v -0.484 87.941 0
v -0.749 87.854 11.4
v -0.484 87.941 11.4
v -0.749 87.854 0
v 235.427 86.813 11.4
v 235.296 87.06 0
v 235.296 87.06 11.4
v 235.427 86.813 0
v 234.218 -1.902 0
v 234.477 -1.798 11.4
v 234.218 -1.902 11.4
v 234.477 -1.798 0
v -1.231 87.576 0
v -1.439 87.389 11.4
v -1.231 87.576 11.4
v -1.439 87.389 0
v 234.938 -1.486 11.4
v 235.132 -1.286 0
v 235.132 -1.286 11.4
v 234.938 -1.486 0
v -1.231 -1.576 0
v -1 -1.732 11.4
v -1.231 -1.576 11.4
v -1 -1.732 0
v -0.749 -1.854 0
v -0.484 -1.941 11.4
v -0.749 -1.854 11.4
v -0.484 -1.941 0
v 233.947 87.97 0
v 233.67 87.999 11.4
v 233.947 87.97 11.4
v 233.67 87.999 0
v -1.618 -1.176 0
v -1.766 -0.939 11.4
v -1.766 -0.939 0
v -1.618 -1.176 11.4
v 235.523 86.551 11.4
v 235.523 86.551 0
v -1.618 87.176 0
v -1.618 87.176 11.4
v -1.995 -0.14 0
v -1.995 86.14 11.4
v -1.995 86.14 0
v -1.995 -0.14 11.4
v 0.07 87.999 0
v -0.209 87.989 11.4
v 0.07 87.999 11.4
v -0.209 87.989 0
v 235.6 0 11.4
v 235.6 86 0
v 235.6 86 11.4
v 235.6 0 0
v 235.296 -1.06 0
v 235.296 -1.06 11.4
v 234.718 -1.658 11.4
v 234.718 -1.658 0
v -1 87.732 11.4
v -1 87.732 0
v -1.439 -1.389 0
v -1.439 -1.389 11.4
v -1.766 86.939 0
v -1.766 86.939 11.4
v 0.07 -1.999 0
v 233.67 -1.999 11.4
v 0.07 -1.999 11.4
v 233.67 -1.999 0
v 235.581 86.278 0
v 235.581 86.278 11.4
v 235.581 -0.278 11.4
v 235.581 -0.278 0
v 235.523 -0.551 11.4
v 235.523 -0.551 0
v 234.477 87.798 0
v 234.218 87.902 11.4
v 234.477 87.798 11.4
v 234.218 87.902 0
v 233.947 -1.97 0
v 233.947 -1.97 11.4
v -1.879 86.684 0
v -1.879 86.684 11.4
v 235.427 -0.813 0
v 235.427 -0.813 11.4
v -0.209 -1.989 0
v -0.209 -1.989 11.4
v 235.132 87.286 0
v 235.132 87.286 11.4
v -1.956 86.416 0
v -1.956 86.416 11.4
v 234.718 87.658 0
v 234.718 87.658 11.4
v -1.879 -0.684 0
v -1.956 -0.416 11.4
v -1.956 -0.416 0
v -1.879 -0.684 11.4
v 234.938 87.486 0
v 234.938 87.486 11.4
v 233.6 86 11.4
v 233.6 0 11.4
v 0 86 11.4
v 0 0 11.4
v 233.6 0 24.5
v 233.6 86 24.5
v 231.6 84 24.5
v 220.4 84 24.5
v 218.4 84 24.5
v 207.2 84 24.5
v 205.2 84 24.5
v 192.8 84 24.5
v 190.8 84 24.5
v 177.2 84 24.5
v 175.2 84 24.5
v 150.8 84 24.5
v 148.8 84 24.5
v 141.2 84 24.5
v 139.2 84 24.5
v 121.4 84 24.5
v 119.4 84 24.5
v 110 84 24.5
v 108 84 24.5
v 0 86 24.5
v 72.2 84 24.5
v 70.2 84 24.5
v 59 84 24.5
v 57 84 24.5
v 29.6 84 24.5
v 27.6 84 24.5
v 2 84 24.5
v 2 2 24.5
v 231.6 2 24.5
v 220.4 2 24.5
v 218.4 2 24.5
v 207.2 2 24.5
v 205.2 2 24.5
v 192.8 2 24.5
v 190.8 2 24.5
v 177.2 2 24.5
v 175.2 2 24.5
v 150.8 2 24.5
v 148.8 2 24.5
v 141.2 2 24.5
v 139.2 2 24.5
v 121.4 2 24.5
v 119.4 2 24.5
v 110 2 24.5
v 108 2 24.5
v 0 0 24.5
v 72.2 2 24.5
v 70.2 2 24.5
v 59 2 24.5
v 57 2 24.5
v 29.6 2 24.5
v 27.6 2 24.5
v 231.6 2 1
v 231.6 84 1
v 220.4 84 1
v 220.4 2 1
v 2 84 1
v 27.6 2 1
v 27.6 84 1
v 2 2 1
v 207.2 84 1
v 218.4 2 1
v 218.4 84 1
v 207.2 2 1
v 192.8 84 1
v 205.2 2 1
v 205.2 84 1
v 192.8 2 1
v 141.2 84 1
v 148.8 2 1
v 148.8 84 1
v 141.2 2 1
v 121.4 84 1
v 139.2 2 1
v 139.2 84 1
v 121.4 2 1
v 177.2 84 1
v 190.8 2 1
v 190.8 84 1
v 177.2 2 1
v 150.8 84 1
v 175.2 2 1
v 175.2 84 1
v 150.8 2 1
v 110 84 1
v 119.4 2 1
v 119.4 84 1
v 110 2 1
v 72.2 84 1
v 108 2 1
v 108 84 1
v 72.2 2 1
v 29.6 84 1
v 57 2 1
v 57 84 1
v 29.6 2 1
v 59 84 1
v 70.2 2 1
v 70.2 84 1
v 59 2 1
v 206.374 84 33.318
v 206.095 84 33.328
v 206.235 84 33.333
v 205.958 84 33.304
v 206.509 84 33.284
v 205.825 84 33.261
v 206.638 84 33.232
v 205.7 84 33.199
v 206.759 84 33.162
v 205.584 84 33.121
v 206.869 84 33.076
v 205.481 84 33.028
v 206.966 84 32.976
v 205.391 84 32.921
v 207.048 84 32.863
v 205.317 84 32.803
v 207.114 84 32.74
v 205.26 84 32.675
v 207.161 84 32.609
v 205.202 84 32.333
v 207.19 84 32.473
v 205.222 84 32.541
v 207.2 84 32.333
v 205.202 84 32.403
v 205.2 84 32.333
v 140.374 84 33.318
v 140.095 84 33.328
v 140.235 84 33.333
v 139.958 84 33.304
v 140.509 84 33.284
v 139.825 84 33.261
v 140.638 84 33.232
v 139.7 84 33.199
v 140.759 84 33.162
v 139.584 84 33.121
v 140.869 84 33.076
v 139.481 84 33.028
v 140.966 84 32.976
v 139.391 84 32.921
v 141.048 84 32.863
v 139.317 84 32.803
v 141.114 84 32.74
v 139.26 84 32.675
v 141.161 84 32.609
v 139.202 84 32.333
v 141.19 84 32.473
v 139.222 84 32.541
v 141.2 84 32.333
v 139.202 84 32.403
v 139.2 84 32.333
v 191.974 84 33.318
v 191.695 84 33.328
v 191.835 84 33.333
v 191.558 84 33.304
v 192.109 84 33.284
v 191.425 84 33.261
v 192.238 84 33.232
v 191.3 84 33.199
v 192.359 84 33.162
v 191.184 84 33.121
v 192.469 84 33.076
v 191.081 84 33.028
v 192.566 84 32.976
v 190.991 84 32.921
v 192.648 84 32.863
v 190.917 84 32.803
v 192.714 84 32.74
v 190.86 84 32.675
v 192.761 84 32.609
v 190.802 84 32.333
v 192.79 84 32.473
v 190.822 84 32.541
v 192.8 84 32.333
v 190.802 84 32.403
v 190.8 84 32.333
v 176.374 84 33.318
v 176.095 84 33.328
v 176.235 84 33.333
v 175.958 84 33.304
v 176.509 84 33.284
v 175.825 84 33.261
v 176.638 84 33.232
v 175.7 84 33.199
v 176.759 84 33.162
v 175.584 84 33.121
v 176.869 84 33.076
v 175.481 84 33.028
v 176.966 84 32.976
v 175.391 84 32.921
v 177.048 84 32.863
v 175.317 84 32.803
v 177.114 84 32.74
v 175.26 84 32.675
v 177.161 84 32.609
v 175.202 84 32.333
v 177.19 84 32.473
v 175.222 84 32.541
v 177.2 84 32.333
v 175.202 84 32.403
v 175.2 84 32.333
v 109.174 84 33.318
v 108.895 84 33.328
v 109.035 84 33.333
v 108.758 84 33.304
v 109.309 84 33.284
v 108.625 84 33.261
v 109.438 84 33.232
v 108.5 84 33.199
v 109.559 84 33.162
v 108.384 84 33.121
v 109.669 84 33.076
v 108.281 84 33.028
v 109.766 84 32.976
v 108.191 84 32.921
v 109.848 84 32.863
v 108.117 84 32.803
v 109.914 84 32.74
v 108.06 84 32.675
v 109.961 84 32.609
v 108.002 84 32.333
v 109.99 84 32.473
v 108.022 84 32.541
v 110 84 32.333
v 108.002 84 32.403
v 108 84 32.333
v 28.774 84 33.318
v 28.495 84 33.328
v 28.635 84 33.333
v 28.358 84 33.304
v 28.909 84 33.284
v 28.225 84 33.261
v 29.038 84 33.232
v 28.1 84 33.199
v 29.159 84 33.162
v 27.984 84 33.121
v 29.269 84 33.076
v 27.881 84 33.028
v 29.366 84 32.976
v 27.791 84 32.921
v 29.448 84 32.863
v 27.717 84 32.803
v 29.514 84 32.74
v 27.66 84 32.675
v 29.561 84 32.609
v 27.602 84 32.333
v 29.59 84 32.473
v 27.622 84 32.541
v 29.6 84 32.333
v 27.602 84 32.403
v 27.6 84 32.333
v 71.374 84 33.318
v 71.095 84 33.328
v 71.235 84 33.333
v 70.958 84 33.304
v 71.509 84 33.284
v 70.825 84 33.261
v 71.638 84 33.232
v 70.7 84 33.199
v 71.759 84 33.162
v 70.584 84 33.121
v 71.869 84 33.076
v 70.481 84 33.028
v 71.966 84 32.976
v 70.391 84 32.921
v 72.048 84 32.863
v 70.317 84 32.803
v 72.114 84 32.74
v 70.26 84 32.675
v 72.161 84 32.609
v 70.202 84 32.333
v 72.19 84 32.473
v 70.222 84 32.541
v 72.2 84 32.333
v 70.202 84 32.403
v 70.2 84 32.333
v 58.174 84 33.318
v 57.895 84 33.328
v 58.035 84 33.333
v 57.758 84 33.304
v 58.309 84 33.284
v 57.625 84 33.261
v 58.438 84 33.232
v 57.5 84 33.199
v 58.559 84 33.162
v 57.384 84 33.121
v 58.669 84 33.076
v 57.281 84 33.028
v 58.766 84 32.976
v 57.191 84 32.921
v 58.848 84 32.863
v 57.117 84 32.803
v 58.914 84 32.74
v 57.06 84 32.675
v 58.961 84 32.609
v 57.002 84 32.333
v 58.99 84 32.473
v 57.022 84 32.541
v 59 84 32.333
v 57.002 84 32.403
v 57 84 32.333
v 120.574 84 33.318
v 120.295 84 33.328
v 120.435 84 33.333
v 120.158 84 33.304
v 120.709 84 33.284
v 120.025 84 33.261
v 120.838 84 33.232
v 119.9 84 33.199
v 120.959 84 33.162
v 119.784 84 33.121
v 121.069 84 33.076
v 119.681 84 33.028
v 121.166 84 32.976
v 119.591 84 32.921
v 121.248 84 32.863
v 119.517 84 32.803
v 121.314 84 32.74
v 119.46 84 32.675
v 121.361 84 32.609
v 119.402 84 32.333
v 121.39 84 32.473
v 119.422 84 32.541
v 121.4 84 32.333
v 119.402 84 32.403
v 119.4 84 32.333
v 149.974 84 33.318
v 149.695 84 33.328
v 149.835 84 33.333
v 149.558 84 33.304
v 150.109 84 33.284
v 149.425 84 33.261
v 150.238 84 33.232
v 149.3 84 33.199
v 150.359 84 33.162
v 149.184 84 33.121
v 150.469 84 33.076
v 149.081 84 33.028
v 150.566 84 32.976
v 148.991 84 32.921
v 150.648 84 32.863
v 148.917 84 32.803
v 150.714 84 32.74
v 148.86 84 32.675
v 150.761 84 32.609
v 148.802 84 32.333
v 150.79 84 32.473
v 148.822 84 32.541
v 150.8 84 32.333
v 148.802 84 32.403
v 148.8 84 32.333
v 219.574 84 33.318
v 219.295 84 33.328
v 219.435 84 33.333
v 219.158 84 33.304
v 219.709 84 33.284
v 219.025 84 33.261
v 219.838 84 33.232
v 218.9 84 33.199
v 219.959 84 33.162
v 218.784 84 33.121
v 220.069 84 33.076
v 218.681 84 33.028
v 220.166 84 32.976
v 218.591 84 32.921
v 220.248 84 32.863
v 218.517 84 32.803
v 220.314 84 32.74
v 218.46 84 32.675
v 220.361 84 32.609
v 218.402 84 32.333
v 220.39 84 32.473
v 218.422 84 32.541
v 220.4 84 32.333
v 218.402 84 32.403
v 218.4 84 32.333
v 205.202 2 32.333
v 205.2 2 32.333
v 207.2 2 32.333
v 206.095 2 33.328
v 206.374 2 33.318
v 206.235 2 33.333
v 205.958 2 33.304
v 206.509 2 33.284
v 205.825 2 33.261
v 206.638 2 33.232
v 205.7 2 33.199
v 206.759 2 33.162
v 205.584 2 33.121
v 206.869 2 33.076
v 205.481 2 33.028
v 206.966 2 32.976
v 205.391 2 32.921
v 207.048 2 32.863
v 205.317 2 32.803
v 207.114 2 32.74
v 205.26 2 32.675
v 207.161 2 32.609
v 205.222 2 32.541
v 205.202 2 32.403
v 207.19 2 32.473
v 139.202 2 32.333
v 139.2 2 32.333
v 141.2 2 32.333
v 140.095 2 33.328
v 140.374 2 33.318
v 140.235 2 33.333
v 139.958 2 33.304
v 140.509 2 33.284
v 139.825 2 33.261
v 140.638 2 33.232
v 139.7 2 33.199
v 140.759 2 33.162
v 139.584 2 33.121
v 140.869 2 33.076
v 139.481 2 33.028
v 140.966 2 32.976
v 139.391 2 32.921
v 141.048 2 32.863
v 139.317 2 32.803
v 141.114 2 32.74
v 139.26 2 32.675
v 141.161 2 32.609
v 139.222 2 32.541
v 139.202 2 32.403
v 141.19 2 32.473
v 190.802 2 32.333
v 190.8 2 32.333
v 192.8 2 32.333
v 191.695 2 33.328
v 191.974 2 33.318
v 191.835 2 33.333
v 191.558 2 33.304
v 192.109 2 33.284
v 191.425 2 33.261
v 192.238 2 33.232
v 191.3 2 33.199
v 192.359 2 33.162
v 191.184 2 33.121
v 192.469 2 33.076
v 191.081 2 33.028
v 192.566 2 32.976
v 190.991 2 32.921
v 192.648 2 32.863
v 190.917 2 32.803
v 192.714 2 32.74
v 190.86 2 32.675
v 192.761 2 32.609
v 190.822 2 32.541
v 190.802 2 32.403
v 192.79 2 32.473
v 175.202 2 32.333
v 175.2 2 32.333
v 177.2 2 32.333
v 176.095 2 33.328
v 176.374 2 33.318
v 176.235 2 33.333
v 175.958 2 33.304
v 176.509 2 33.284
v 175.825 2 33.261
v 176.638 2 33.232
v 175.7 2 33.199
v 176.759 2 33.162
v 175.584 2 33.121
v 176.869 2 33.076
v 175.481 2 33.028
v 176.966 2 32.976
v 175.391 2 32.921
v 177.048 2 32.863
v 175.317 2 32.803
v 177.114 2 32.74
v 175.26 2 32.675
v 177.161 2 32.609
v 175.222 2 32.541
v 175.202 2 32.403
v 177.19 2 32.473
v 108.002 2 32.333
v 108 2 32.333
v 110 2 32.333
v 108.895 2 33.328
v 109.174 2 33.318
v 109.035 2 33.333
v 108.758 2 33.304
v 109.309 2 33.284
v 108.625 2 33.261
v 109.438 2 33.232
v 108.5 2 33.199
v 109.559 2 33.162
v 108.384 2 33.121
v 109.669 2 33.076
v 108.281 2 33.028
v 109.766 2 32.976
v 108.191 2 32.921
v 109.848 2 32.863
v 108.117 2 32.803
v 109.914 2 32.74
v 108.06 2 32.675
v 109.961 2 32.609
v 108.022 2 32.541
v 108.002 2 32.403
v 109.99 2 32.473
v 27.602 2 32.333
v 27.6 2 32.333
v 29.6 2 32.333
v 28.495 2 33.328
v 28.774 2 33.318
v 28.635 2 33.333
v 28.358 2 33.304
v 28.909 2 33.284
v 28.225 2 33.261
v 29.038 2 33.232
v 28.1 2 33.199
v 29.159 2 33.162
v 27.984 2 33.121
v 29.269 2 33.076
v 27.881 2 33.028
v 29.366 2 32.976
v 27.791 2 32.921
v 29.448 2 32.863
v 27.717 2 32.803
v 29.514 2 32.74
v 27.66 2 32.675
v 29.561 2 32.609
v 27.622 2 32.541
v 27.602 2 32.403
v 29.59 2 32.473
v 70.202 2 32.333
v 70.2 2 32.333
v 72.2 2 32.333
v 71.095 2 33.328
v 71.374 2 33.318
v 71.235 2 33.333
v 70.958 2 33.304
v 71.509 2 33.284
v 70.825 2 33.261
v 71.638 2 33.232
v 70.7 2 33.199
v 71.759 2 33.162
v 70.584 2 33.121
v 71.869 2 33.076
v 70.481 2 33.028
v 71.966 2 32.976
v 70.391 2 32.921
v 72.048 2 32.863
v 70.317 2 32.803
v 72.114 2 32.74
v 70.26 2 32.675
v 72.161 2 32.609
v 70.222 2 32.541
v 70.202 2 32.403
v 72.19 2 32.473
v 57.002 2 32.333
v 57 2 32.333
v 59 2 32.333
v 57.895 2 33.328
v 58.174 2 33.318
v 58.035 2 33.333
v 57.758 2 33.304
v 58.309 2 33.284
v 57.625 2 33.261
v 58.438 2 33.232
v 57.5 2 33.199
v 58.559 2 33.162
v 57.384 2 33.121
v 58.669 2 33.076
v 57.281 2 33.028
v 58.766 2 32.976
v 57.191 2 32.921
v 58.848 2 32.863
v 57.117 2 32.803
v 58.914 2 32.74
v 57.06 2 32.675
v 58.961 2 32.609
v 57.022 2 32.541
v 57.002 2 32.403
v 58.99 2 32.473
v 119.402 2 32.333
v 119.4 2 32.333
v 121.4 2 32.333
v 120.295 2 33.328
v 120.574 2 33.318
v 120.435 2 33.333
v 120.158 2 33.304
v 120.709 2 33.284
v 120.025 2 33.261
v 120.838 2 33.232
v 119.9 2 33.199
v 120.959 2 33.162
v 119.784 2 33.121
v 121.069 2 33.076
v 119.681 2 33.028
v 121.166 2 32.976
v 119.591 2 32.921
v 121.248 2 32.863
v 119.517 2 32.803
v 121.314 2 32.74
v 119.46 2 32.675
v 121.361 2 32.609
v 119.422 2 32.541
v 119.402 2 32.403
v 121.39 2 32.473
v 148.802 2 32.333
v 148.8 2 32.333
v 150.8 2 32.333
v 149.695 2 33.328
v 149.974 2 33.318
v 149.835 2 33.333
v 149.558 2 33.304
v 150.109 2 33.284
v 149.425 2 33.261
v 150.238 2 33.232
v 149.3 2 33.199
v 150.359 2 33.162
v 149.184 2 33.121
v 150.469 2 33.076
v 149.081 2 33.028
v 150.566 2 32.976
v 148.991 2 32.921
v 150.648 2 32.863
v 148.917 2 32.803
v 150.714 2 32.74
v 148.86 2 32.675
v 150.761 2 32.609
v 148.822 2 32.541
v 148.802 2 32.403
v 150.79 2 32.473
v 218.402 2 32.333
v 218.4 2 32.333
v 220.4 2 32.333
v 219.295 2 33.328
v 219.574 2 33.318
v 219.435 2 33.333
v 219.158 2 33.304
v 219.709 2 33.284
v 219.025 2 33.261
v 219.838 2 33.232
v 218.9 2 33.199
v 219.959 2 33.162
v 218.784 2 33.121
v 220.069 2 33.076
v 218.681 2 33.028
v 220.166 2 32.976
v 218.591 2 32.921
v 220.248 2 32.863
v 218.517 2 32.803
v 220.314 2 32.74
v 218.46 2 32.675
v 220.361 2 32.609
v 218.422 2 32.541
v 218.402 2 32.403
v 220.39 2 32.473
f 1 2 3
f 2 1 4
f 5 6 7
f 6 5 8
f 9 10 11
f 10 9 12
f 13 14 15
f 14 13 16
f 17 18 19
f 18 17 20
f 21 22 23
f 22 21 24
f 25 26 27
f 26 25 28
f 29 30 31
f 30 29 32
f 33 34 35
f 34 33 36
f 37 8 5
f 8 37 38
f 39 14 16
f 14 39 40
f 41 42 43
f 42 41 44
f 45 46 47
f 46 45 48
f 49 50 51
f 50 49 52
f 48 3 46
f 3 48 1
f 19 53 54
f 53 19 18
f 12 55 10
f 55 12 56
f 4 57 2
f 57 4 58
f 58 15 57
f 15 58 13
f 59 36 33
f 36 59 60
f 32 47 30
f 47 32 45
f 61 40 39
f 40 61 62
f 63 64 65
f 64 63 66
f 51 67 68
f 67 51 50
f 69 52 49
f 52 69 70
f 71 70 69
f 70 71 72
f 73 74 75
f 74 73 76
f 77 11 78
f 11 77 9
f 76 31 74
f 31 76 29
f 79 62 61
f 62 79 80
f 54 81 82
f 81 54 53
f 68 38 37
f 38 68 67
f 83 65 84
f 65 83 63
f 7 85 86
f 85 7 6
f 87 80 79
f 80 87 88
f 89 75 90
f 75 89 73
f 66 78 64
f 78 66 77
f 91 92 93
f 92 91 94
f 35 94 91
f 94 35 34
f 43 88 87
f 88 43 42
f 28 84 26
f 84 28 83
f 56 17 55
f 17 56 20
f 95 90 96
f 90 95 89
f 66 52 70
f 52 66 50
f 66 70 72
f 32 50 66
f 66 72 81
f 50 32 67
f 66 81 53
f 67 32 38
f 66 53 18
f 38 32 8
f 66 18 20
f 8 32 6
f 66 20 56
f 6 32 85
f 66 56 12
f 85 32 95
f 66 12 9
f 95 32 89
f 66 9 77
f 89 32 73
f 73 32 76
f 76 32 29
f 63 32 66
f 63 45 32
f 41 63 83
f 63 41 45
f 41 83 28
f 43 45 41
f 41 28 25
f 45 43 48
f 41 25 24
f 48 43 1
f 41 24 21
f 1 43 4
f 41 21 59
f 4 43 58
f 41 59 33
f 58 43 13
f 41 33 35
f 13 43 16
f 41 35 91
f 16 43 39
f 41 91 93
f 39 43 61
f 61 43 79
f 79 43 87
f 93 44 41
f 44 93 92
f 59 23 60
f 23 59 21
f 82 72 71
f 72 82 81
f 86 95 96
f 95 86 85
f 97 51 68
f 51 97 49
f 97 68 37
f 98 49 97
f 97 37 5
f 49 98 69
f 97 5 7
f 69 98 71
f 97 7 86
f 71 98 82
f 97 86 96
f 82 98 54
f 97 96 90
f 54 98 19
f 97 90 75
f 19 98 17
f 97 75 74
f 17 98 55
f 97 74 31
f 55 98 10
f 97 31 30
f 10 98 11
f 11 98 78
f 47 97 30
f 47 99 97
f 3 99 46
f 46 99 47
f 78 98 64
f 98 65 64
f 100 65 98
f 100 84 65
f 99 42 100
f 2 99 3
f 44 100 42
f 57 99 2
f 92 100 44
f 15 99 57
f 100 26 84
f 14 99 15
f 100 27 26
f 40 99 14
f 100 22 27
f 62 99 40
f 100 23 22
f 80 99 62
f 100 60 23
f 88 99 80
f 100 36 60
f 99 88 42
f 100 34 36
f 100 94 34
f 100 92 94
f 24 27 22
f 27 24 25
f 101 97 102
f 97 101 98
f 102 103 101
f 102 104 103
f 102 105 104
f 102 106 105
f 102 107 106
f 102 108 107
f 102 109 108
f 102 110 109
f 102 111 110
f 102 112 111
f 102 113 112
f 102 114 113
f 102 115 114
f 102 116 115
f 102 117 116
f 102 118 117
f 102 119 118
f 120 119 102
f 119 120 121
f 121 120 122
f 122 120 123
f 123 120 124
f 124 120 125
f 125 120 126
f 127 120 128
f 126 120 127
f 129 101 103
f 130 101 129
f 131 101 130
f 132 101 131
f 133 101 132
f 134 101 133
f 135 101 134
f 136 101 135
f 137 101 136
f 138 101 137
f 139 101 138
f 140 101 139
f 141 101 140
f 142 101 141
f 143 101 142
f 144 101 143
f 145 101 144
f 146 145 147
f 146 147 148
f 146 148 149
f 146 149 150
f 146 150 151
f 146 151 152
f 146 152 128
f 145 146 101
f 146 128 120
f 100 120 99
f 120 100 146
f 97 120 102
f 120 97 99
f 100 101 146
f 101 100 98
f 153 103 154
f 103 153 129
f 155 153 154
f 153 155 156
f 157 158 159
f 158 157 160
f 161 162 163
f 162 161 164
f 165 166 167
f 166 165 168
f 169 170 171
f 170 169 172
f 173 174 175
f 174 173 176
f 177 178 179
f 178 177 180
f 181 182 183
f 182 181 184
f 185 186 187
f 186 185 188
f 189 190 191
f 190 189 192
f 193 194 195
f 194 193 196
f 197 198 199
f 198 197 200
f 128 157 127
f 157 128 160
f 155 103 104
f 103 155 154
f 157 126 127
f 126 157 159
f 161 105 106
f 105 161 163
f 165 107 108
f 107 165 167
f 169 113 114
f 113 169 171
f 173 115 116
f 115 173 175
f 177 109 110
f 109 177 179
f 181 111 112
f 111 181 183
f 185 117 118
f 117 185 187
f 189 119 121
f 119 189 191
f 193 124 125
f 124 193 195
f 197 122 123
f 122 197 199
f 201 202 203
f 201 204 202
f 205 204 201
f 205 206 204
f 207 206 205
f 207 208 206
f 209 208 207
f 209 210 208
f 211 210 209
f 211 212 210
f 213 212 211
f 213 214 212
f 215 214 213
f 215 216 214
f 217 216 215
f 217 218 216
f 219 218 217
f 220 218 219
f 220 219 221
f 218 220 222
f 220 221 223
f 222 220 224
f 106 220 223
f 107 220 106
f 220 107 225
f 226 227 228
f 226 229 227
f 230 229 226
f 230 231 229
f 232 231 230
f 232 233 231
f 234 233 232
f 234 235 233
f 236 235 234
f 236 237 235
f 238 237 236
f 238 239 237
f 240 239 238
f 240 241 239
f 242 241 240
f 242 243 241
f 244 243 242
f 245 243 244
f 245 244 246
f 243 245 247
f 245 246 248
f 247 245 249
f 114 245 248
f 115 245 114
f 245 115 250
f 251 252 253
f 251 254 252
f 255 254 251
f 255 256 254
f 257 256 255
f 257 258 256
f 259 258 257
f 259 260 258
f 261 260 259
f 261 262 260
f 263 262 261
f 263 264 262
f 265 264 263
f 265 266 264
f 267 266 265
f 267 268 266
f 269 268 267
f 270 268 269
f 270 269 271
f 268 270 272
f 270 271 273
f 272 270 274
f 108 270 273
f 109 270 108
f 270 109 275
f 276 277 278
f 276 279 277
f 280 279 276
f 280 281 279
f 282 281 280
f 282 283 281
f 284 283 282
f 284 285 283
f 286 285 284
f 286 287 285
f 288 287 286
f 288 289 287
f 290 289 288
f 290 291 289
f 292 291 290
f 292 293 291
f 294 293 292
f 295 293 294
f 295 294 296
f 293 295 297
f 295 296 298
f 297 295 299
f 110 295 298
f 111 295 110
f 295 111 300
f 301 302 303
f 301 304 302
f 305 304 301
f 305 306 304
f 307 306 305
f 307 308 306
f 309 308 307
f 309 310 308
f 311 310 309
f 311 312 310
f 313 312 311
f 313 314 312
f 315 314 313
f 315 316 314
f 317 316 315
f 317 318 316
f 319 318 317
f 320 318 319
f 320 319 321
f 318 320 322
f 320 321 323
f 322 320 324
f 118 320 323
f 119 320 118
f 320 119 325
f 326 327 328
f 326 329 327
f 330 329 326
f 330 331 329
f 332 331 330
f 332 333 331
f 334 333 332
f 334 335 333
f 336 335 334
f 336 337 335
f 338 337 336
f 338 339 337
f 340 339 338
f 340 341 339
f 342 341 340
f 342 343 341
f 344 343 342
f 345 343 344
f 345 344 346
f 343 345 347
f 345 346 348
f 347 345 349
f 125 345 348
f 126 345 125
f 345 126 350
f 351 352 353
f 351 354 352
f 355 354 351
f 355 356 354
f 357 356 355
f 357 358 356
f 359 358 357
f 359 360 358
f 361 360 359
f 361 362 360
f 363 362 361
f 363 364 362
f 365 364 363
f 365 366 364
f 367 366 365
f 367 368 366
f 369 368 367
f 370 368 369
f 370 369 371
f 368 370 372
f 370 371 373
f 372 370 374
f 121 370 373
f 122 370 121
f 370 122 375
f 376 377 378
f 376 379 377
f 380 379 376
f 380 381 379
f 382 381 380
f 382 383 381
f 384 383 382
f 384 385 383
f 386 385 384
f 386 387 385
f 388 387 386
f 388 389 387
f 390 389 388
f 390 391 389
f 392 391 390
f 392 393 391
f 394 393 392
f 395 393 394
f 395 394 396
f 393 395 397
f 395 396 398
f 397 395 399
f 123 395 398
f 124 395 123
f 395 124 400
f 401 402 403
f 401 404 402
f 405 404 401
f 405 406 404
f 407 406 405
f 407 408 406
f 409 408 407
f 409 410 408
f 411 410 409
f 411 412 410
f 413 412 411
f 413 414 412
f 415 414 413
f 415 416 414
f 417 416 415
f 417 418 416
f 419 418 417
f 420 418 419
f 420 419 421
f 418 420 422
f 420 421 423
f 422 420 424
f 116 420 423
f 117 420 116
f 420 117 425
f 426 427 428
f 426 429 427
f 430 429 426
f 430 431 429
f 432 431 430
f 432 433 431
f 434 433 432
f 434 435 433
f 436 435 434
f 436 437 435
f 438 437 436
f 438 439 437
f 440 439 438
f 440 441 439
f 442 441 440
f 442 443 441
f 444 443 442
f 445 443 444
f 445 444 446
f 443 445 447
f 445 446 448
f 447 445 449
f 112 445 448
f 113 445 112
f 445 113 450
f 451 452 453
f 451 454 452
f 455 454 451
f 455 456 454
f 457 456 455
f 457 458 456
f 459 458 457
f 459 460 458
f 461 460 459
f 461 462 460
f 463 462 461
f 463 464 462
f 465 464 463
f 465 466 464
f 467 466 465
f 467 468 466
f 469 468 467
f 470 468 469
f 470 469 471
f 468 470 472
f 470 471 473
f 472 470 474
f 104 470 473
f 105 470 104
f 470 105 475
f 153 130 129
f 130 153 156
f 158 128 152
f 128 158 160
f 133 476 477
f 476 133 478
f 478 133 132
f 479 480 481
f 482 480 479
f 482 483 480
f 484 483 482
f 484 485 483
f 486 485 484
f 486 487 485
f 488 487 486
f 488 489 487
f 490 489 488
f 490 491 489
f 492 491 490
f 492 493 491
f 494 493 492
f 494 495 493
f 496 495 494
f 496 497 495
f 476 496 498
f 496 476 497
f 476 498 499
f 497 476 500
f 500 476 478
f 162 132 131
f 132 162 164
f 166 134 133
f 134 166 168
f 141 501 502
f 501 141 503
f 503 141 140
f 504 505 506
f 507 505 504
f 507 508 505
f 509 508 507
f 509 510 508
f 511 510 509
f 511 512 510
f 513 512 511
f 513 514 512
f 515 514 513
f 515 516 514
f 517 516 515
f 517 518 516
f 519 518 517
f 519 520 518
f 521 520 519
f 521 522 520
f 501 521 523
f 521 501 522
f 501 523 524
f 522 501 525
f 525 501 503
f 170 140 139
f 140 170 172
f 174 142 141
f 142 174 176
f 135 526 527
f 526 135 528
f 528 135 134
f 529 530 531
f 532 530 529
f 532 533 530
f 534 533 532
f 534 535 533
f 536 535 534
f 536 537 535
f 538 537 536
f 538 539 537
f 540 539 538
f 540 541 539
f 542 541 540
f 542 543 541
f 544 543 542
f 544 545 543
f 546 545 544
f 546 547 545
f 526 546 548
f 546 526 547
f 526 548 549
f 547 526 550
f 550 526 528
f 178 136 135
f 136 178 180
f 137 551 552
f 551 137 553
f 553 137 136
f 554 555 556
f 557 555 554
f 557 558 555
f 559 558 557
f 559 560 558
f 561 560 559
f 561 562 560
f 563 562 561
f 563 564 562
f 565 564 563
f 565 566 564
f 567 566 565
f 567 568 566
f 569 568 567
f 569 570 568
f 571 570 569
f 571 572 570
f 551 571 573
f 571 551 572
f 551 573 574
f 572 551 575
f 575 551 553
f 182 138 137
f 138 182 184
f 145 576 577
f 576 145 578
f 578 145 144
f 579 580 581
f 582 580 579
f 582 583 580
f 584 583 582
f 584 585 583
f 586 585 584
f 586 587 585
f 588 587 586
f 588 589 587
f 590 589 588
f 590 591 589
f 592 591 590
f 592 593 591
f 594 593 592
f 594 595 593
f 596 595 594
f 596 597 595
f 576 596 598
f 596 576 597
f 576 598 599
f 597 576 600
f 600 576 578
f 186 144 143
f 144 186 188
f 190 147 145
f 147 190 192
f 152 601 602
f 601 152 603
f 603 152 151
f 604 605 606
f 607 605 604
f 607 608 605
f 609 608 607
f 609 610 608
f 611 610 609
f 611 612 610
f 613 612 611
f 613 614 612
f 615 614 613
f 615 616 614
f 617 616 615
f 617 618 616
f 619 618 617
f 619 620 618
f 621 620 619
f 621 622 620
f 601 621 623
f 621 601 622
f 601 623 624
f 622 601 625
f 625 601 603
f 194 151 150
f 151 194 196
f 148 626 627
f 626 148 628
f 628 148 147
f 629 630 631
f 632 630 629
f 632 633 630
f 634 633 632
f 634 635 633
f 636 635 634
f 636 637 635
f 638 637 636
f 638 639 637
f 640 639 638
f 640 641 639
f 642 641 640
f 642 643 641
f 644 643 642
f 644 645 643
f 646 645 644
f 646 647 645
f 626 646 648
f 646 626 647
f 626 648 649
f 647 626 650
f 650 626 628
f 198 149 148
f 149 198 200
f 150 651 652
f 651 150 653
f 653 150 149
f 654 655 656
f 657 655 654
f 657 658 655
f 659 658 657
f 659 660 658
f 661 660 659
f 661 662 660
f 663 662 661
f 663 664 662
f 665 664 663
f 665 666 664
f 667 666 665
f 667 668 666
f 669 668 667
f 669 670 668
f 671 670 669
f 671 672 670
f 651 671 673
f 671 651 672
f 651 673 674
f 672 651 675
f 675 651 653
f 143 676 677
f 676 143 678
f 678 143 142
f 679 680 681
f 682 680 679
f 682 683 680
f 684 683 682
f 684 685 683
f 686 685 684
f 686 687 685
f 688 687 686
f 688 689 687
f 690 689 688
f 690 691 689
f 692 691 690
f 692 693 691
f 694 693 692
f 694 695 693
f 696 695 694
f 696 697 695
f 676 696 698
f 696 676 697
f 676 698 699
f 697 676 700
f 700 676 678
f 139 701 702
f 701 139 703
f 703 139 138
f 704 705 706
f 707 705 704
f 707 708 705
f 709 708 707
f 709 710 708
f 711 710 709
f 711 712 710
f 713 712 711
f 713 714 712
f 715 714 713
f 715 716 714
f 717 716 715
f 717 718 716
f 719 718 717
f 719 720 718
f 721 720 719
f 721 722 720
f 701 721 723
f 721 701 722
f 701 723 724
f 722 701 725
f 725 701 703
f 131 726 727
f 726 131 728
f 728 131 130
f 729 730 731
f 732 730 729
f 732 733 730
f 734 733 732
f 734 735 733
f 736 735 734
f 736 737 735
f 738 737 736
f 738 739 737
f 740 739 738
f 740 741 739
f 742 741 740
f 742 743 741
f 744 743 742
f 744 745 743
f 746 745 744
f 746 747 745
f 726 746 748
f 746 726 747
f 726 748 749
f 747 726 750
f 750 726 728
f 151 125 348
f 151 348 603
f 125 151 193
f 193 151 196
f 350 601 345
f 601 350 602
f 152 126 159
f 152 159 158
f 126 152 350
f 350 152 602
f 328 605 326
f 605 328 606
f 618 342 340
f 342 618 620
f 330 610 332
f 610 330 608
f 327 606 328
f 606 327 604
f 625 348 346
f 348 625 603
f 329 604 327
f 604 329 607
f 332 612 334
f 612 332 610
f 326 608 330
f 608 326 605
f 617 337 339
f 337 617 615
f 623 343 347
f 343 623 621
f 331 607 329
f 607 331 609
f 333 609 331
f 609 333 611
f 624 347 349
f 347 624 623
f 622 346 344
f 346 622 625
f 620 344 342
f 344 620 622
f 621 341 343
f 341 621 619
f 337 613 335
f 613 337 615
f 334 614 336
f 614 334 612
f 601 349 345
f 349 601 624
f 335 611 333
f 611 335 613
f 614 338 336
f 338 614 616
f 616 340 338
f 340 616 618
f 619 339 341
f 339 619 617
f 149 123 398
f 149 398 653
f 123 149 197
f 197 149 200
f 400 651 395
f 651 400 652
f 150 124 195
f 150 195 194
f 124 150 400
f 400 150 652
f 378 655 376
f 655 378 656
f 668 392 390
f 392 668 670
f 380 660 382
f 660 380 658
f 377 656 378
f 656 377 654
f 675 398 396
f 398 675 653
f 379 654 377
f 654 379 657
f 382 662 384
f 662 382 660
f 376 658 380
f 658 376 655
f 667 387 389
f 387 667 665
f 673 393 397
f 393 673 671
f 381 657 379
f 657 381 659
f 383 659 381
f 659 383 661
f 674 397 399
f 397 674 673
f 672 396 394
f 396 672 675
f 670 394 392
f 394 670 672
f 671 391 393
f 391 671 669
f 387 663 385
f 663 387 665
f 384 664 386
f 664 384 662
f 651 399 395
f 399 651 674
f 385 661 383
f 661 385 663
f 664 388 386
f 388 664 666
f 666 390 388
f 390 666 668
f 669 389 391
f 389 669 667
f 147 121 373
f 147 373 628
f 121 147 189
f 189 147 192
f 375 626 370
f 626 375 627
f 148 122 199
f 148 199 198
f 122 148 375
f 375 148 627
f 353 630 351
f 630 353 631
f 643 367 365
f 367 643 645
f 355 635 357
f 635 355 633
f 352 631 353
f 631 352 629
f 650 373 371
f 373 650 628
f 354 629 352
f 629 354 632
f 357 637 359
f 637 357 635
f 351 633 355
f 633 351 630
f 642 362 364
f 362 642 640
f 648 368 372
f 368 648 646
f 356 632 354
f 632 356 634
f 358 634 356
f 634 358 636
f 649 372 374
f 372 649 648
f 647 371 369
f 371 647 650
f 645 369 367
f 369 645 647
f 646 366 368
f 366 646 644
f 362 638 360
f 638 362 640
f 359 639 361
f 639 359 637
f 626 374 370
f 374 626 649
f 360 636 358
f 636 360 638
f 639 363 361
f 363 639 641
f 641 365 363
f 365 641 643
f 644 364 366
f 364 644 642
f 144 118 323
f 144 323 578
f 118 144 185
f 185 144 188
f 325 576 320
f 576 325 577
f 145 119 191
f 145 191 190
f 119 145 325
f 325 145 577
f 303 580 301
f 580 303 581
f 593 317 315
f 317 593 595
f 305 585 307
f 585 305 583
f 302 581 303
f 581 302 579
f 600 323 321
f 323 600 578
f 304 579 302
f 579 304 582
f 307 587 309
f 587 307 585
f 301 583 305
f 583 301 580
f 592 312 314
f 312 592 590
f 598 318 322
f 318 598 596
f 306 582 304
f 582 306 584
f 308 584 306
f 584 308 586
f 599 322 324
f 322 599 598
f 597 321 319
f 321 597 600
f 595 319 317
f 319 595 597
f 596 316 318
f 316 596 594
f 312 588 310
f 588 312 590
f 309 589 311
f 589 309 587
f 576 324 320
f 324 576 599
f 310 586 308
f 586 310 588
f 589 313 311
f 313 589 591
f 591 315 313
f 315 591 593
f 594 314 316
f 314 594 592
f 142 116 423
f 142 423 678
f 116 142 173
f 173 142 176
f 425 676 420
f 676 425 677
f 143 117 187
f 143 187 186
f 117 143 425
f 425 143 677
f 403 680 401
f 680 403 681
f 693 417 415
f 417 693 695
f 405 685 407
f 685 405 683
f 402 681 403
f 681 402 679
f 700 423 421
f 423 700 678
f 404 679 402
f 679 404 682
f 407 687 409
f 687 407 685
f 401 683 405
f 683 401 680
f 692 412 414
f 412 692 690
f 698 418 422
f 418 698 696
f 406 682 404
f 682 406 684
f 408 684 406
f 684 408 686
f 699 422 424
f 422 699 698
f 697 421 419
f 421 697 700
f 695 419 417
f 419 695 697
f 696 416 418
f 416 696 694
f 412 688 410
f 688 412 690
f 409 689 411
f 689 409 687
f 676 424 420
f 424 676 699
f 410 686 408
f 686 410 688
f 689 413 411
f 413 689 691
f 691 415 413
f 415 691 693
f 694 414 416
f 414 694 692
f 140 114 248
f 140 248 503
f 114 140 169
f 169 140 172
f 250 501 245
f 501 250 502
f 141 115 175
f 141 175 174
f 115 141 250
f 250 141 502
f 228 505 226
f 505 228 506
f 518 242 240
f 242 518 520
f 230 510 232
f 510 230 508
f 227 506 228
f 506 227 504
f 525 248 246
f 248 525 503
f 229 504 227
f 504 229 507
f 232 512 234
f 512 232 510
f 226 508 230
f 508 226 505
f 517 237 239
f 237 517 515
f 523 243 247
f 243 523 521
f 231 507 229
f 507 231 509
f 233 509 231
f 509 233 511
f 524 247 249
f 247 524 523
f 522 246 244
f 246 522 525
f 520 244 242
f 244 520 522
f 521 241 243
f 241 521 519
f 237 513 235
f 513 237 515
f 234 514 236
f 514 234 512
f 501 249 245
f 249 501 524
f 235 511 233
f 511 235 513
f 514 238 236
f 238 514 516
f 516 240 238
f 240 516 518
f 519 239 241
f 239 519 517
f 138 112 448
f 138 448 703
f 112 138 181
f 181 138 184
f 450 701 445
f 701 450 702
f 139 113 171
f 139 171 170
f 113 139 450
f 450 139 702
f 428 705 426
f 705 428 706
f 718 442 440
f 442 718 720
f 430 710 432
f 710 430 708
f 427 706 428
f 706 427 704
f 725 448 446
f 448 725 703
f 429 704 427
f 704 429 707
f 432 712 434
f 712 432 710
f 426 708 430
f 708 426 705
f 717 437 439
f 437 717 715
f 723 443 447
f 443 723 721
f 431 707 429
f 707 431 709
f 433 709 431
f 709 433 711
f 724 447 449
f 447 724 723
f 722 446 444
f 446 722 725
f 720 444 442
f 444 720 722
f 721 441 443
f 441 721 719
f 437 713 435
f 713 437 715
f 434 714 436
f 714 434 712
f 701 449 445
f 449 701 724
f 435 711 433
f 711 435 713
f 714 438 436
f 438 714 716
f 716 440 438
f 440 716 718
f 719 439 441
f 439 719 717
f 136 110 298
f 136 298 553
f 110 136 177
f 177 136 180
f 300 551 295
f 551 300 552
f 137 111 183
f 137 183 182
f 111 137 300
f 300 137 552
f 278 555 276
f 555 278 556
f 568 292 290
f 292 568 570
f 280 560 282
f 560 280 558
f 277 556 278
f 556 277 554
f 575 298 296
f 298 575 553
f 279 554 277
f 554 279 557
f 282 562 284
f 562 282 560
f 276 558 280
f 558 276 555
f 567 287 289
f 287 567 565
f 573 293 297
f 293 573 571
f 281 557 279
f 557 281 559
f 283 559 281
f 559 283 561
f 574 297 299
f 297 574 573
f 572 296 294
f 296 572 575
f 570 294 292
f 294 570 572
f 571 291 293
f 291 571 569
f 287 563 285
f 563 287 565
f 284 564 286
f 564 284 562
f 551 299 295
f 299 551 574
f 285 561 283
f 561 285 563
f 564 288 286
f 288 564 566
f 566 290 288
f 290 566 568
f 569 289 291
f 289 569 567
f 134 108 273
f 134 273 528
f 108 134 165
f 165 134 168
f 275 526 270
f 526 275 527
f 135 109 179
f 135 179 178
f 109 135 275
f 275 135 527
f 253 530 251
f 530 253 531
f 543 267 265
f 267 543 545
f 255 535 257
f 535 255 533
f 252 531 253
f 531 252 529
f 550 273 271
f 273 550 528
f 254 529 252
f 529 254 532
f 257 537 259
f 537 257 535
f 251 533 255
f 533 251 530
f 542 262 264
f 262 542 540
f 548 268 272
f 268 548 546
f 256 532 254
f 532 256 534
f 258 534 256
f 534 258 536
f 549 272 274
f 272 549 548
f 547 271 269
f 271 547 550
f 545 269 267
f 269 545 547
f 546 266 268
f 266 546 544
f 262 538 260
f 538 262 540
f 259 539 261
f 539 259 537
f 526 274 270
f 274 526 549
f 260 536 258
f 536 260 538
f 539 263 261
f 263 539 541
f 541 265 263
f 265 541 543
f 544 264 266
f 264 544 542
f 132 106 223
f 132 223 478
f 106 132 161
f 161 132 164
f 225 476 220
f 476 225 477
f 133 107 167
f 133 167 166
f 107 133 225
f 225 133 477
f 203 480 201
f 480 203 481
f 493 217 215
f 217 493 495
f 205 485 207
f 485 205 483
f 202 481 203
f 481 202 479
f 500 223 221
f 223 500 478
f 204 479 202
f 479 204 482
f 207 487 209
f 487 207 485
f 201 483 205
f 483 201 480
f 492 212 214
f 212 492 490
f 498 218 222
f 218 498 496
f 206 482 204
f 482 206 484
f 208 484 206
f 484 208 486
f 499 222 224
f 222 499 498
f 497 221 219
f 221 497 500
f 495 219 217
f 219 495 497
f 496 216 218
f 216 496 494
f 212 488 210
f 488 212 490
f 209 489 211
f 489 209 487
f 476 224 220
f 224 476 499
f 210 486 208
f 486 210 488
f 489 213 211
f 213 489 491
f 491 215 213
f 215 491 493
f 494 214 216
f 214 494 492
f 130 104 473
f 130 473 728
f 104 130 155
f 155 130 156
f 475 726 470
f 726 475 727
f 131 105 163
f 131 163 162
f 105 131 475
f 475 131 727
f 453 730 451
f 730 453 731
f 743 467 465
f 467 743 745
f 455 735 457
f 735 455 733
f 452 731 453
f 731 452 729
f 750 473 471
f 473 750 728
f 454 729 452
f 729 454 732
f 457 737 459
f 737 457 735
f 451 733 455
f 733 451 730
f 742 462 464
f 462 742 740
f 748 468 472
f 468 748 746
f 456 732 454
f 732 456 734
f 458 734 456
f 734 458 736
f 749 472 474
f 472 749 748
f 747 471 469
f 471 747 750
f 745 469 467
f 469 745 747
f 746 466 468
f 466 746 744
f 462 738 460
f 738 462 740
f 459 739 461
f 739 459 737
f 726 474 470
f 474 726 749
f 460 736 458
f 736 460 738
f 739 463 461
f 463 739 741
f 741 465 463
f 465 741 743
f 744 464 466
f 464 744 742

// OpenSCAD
// Outpost 20th Anniversary Edition
//
// by W. Craig Trader is dual-licensed under 
// Creative Commons Attribution-ShareAlike 3.0 Unported License and
// GNU Lesser GPL 3.0 or later.

include <MCAD/units.scad>;

// Physical dimensions of a sleeved card
CARD_WIDTH = 47 * mm;
CARD_HEIGHT = 72 * mm;
CARD_THICKNESS = 0.6 * mm;

// Define sizes of tray slots
tray1 = [
    36, // Ore
    39, // Water
    12, // Mega Water
    53, // Titanium
     9, // Mega Titanium
];

tray2 = [
    23, // New Chemicals
     6, // Mega New Chemicals
    34, // Research
    16, // Microbiotics
    14, // Orbital Medicine
    12, // Ring Ore
    12, // Moon Ore
];

large_tray = concat( tray1, tray2 );

// Physical dimensions
WALL = 0.8 * mm;    // Slicing filament thickness
GAP  = 0.2 * mm;    // Size differential between box and lid, for snug fit
PADDING = 4 * mm;   // Additional space for each slot, to make 
SPACING = 10 * mm;  // Space around cards to make them easier to insert / extract
LID = 1 * mm;       // Thickness of lid top
BOTTOM = 1 * mm;    // Thickness of box bottom
OVERLAP = 0.1 * mm; // To ensure no artifacts

// Inner and Outer wall dimensions
OUTER = 2.5 * WALL;
INNER = 2.5 * WALL;

// Command Line Arguments
PART = "large-box";	// Which part to output
VERBOSE = 1;        // Set to non-zero to see more data

if (VERBOSE) echo (Bottom=BOTTOM, Lid=LID, InnerWall=INNER, OuterWall=OUTER);

$fn=45;

// For a given slot (1 to n), calculate the depth of the slot
function slot_size( trayz, n ) = trayz[n-1] * CARD_THICKNESS + PADDING;

// For a given slot, calculate the width of that slot, plus all previous slots
function sum_sizes( trayz, n ) = n <= 0 ? 0 : sum_sizes( trayz, n-1 ) + slot_size( trayz, n );

// ----- Render the card tray itself ------------------------------------------

module tray_bottom( trayz ) {
    slots = len( trayz );
    
    inner_x = sum_sizes( trayz, slots ) + (slots-1) * INNER;
    inner_y = CARD_HEIGHT + SPACING;
    inner_z = CARD_WIDTH;
    
    box_x = inner_x + 2 * INNER;
    box_y = inner_y + 2 * INNER;
    box_z = inner_z / 5 + BOTTOM;
    
    lip_x = inner_x + 2 * INNER;
    lip_y = inner_y + 2 * INNER;
    lip_z = inner_z / 2 + BOTTOM;
    
    div_z = 2/3 * inner_z;
    div_r = INNER / 2;
    
    if (VERBOSE) {
        echo (InnerLength=inner_x, InnerDepth=inner_y, InnerHeight=inner_z);
        echo (LipLength=lip_x, LipDepth=lip_y, LipHeight=lip_z, DividerHeight=div_z+div_r);
    }
    echo (TrayLength=box_x+2*OUTER, TrayDepth=box_y+2*OUTER, TrayHeight=box_z);
    
    union() {
        difference() {
            union() {
                minkowski() {
                    cube( [ box_x, box_y, box_z ] );
                    cylinder( r=OUTER, h=1 );
                }
                cube( [ lip_x, lip_y, lip_z ] );
            }
            
            // Remove inside of box
            translate( [ INNER, INNER, BOTTOM ] )
                cube( [ inner_x, inner_y, inner_z+OVERLAP ] );
        }
        
        for (s=[1:slots-1]) {
            sx = sum_sizes(trayz, s);
            dx = sx + s*INNER;
            
            if (VERBOSE) {
                echo (s=s, ss=trayz[s-1], sl=slot_size(trayz, s), sx=sx, dx=dx );
            }
            
            translate( [dx,INNER,BOTTOM] ) {
                cube( [INNER, inner_y, div_z] );
                translate( [div_r,0,div_z] )
                    rotate( [-90,0,0])
                        cylinder( h=inner_y, r=div_r );
            }
        }
    }
}

// ----- Render a lid for the tray --------------------------------------------

module tray_lid(trayz) {
    slots = len( trayz );
    
    inner_x = sum_sizes( trayz, slots ) + (slots-1) * INNER;
    inner_y = CARD_HEIGHT + SPACING;
    inner_z = CARD_WIDTH;
    
    lid_x = inner_x + 2 * INNER;
    lid_y = inner_y + 2 * INNER;
    lid_z = 4/5 * inner_z + LID;
    
    out_x = lid_x + 2 * OUTER;
    out_y = lid_y + 2 * OUTER;
    
    notch_r = 10 * mm;
    
    if (VERBOSE) {
        echo (InnerLength=inner_x, InnerDepth=inner_y, InnerHeight=inner_z);
    }
    echo (LidLength=out_x, LidDepth=out_y, LidHeight=lid_z);

    difference() {
        // Outside of lid
        minkowski() {
            cube( [ lid_x, lid_y, lid_z ] );
            cylinder( r=OUTER, h=OVERLAP );
        }
        
        // Remove inside of lid
        translate( [ 0, 0, LID ] )
            cube( [ lid_x, lid_y, lid_z+OVERLAP ] );
        
        // Remove notches to make it easier to remove the lid
        translate( [out_x/2-OUTER-OVERLAP,lid_y/2,lid_z] ) 
            rotate( [0,90,0] )
                cylinder( r=notch_r, h=out_x+4*OVERLAP, center=true );
    }
}

// ----- Choose which part to output ------------------------------------------
 
if (PART == "large-box") {
    tray_bottom(large_tray);
} else if (PART == "large-lid") {
    tray_lid(large_tray);
} else if (PART == "1-box") {
    tray_bottom(tray1);
} else if (PART == "1-lid") {
    tray_lid(tray1);
} else if (PART == "2-box") {
    tray_bottom(tray2);
} else if (PART == "2-lid") {
    tray_lid(tray2);
}
